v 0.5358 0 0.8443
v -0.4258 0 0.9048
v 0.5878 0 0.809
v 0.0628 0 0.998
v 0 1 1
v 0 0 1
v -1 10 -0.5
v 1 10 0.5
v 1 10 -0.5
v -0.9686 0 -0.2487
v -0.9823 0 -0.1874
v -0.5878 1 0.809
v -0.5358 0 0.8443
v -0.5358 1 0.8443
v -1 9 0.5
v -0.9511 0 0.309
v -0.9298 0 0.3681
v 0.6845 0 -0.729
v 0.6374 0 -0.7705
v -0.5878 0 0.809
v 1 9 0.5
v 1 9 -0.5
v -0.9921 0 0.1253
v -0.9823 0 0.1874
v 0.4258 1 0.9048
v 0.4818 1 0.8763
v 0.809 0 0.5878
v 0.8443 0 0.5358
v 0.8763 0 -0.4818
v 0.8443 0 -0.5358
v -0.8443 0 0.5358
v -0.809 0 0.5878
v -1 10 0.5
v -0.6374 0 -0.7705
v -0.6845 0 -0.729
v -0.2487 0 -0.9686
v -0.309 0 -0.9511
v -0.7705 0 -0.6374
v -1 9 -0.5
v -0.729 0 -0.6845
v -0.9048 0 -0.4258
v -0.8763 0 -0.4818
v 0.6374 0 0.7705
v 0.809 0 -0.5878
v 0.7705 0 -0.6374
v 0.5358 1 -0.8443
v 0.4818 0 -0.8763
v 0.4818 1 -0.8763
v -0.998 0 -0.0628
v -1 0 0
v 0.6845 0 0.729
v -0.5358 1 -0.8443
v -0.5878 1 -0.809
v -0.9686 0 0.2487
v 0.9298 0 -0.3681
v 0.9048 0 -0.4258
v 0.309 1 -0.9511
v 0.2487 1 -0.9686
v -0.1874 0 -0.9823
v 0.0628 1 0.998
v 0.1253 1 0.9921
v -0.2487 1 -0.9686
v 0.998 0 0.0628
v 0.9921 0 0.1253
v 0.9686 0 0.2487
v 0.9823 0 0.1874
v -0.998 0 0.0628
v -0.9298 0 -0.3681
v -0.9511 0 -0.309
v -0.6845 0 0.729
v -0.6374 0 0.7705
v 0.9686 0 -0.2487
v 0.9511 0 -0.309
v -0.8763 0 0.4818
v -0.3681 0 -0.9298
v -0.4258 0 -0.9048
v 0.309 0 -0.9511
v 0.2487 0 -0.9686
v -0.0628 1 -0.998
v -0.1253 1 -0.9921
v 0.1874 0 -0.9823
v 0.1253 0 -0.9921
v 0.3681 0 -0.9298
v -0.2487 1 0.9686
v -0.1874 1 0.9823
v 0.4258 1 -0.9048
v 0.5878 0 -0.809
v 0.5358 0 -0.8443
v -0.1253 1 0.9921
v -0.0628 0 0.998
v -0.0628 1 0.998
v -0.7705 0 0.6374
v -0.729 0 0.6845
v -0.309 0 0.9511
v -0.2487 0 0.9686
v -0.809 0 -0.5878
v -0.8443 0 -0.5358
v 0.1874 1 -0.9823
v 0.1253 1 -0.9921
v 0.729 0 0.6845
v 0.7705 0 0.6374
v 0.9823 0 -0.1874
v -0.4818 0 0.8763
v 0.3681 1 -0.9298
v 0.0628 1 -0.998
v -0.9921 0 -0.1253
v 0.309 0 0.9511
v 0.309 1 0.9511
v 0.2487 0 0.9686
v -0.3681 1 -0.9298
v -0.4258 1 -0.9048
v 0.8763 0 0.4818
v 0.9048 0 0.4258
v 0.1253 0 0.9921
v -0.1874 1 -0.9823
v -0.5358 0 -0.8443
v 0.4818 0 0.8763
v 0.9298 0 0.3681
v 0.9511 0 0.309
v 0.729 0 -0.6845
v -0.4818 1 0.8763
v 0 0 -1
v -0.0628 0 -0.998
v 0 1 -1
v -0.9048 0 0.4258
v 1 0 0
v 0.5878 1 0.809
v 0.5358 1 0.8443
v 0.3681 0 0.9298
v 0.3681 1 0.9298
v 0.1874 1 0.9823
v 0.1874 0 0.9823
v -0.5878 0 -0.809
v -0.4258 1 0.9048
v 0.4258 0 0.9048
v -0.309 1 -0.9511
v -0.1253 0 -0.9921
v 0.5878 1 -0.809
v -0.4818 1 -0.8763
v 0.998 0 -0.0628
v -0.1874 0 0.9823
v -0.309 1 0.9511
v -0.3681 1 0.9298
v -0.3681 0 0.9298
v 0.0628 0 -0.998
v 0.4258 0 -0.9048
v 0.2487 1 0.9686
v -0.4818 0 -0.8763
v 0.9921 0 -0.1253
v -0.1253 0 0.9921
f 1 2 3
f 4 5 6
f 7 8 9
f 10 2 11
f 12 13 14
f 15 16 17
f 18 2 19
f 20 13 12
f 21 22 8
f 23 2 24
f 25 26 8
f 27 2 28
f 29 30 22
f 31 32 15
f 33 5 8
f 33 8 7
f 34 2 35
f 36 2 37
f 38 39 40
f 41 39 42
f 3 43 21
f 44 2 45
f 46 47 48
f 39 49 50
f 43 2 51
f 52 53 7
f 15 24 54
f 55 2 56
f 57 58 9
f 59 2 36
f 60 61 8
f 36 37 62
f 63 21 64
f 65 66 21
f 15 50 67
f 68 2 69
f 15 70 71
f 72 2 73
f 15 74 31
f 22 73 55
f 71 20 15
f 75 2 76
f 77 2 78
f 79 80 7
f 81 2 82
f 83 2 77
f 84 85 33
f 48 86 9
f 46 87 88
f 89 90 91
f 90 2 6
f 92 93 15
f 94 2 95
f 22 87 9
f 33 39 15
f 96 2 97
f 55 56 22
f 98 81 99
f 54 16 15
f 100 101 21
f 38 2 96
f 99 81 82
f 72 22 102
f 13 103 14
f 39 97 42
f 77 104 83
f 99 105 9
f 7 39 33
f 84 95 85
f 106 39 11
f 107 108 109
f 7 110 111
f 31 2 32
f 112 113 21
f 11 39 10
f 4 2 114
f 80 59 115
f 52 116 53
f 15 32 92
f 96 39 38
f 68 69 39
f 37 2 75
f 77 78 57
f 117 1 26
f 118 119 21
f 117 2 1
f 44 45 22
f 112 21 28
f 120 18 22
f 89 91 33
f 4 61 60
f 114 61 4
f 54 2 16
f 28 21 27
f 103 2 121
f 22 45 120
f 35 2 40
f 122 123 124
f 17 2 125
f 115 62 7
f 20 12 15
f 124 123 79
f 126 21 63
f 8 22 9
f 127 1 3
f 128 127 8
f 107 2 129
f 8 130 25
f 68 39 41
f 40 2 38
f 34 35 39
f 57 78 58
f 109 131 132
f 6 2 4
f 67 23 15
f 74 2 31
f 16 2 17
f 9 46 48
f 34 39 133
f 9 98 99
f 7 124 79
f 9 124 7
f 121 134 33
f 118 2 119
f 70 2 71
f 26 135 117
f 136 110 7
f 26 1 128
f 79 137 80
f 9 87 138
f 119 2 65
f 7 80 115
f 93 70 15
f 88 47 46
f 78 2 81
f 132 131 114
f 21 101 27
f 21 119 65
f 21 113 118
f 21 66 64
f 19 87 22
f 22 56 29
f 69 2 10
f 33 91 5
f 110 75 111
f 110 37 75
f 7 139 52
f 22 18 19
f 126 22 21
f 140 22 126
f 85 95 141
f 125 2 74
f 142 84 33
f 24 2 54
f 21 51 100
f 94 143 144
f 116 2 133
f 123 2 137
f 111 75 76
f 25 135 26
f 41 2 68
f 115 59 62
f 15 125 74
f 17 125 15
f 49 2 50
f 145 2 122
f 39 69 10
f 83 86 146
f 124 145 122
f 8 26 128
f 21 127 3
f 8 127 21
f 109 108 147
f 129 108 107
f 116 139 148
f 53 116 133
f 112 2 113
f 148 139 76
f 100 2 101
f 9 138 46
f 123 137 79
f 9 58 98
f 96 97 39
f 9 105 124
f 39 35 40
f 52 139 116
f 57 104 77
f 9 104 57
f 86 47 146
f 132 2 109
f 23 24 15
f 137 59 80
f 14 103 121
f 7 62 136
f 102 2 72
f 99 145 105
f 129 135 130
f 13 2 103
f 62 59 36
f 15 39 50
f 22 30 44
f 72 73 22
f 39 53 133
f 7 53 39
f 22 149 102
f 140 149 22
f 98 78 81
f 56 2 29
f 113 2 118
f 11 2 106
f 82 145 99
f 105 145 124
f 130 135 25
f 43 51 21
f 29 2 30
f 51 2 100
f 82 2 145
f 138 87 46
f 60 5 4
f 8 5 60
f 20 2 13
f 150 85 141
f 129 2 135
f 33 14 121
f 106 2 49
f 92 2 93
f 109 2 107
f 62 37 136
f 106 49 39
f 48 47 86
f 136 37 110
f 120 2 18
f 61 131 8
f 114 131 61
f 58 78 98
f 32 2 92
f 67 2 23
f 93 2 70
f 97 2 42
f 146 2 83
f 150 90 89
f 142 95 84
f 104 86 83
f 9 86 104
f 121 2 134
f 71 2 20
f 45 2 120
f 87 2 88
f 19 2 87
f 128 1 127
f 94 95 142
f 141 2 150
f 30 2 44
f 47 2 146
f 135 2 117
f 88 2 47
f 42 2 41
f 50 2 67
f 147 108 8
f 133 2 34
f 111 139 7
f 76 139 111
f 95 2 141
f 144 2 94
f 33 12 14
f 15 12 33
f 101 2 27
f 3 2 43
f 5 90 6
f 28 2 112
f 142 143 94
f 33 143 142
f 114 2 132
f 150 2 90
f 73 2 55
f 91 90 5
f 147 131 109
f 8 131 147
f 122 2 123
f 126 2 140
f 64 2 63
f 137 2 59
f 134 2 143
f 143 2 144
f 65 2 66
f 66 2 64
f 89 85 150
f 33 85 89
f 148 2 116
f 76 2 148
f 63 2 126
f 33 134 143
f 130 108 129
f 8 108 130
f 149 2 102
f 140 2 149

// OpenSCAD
module circ2rect(r = 1, w = 2, h = 1, l = 10, e = 1, fn = 100, baseslevel = 0, inclevel = 0) {

// produced shape with a circular cross-section at one end and rectangular cross-section at the other.

// r = circle radius
// w & h = width and height of rectangle
// l = length
// e = length of cylinder & cuboid
// baseslevel = 0 for centres of circle and rectangle level, 1 for bases level
// inclevel = increase in level from circle to rectangle

    ct = baseslevel * r;
    rt = baseslevel * h/2 + inclevel;

    hull() {
        // cylinder
        translate([0,0,ct]){
            rotate([-90,0,0]){
                cylinder(r=r, h = e, $fn = fn);
            }
        }
        // rectangle
        translate([0, l - e/2, rt]) {
            cube([w,e,h], center = true);
        }
    }
}

circ2rect();
